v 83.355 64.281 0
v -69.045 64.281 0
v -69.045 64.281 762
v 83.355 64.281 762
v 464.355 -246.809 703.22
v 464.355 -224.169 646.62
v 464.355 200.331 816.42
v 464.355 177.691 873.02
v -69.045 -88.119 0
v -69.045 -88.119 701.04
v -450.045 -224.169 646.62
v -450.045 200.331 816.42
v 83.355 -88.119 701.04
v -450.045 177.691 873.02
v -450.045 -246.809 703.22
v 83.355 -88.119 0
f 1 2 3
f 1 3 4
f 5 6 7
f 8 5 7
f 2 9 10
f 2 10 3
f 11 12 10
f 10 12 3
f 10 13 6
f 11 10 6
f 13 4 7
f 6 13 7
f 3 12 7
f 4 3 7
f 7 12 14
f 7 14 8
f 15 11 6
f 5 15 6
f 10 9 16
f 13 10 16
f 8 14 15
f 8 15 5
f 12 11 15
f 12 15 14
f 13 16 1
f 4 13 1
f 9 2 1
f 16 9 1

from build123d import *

# Parameters (mm, degrees)
F0_W     = 152.4
F0_H     = 152.4
F1_DEPTH = 762
F3_DEPTH = 152.401
F4_W     = 914.4
F4_H     = 457.2
F5_DEPTH = 60.96


with BuildPart() as f1:
    # F0 (on Top) → F1 (new body)
    with BuildSketch(Plane.XY):
        with Locations((7.154546032, -11.9188567623)):
            Rectangle(F0_W, F0_H)
    extrude(amount=F1_DEPTH)

    # F2 (on face) → F3 (cut, through all)
    with BuildSketch(Plane.YZ.offset(83.354546032)):
        Polygon((64.2811432377, 762), (-88.1188567623, 762), (-88.1188567623, 701.04), align=None)
    extrude(amount=-F3_DEPTH, mode=Mode.SUBTRACT)

    # F4 (on face) → F5 (join)
    with BuildSketch(Plane(origin=(0, -253.8922561052, 634.7306402629), x_dir=(1, 0, 0), z_dir=(0, -0.3713906764, 0.9284766909))):
        with Locations((7.154546032, 260.6133268807)):
            Rectangle(F4_W, F4_H)
    extrude(amount=F5_DEPTH)


solid = f1.part
